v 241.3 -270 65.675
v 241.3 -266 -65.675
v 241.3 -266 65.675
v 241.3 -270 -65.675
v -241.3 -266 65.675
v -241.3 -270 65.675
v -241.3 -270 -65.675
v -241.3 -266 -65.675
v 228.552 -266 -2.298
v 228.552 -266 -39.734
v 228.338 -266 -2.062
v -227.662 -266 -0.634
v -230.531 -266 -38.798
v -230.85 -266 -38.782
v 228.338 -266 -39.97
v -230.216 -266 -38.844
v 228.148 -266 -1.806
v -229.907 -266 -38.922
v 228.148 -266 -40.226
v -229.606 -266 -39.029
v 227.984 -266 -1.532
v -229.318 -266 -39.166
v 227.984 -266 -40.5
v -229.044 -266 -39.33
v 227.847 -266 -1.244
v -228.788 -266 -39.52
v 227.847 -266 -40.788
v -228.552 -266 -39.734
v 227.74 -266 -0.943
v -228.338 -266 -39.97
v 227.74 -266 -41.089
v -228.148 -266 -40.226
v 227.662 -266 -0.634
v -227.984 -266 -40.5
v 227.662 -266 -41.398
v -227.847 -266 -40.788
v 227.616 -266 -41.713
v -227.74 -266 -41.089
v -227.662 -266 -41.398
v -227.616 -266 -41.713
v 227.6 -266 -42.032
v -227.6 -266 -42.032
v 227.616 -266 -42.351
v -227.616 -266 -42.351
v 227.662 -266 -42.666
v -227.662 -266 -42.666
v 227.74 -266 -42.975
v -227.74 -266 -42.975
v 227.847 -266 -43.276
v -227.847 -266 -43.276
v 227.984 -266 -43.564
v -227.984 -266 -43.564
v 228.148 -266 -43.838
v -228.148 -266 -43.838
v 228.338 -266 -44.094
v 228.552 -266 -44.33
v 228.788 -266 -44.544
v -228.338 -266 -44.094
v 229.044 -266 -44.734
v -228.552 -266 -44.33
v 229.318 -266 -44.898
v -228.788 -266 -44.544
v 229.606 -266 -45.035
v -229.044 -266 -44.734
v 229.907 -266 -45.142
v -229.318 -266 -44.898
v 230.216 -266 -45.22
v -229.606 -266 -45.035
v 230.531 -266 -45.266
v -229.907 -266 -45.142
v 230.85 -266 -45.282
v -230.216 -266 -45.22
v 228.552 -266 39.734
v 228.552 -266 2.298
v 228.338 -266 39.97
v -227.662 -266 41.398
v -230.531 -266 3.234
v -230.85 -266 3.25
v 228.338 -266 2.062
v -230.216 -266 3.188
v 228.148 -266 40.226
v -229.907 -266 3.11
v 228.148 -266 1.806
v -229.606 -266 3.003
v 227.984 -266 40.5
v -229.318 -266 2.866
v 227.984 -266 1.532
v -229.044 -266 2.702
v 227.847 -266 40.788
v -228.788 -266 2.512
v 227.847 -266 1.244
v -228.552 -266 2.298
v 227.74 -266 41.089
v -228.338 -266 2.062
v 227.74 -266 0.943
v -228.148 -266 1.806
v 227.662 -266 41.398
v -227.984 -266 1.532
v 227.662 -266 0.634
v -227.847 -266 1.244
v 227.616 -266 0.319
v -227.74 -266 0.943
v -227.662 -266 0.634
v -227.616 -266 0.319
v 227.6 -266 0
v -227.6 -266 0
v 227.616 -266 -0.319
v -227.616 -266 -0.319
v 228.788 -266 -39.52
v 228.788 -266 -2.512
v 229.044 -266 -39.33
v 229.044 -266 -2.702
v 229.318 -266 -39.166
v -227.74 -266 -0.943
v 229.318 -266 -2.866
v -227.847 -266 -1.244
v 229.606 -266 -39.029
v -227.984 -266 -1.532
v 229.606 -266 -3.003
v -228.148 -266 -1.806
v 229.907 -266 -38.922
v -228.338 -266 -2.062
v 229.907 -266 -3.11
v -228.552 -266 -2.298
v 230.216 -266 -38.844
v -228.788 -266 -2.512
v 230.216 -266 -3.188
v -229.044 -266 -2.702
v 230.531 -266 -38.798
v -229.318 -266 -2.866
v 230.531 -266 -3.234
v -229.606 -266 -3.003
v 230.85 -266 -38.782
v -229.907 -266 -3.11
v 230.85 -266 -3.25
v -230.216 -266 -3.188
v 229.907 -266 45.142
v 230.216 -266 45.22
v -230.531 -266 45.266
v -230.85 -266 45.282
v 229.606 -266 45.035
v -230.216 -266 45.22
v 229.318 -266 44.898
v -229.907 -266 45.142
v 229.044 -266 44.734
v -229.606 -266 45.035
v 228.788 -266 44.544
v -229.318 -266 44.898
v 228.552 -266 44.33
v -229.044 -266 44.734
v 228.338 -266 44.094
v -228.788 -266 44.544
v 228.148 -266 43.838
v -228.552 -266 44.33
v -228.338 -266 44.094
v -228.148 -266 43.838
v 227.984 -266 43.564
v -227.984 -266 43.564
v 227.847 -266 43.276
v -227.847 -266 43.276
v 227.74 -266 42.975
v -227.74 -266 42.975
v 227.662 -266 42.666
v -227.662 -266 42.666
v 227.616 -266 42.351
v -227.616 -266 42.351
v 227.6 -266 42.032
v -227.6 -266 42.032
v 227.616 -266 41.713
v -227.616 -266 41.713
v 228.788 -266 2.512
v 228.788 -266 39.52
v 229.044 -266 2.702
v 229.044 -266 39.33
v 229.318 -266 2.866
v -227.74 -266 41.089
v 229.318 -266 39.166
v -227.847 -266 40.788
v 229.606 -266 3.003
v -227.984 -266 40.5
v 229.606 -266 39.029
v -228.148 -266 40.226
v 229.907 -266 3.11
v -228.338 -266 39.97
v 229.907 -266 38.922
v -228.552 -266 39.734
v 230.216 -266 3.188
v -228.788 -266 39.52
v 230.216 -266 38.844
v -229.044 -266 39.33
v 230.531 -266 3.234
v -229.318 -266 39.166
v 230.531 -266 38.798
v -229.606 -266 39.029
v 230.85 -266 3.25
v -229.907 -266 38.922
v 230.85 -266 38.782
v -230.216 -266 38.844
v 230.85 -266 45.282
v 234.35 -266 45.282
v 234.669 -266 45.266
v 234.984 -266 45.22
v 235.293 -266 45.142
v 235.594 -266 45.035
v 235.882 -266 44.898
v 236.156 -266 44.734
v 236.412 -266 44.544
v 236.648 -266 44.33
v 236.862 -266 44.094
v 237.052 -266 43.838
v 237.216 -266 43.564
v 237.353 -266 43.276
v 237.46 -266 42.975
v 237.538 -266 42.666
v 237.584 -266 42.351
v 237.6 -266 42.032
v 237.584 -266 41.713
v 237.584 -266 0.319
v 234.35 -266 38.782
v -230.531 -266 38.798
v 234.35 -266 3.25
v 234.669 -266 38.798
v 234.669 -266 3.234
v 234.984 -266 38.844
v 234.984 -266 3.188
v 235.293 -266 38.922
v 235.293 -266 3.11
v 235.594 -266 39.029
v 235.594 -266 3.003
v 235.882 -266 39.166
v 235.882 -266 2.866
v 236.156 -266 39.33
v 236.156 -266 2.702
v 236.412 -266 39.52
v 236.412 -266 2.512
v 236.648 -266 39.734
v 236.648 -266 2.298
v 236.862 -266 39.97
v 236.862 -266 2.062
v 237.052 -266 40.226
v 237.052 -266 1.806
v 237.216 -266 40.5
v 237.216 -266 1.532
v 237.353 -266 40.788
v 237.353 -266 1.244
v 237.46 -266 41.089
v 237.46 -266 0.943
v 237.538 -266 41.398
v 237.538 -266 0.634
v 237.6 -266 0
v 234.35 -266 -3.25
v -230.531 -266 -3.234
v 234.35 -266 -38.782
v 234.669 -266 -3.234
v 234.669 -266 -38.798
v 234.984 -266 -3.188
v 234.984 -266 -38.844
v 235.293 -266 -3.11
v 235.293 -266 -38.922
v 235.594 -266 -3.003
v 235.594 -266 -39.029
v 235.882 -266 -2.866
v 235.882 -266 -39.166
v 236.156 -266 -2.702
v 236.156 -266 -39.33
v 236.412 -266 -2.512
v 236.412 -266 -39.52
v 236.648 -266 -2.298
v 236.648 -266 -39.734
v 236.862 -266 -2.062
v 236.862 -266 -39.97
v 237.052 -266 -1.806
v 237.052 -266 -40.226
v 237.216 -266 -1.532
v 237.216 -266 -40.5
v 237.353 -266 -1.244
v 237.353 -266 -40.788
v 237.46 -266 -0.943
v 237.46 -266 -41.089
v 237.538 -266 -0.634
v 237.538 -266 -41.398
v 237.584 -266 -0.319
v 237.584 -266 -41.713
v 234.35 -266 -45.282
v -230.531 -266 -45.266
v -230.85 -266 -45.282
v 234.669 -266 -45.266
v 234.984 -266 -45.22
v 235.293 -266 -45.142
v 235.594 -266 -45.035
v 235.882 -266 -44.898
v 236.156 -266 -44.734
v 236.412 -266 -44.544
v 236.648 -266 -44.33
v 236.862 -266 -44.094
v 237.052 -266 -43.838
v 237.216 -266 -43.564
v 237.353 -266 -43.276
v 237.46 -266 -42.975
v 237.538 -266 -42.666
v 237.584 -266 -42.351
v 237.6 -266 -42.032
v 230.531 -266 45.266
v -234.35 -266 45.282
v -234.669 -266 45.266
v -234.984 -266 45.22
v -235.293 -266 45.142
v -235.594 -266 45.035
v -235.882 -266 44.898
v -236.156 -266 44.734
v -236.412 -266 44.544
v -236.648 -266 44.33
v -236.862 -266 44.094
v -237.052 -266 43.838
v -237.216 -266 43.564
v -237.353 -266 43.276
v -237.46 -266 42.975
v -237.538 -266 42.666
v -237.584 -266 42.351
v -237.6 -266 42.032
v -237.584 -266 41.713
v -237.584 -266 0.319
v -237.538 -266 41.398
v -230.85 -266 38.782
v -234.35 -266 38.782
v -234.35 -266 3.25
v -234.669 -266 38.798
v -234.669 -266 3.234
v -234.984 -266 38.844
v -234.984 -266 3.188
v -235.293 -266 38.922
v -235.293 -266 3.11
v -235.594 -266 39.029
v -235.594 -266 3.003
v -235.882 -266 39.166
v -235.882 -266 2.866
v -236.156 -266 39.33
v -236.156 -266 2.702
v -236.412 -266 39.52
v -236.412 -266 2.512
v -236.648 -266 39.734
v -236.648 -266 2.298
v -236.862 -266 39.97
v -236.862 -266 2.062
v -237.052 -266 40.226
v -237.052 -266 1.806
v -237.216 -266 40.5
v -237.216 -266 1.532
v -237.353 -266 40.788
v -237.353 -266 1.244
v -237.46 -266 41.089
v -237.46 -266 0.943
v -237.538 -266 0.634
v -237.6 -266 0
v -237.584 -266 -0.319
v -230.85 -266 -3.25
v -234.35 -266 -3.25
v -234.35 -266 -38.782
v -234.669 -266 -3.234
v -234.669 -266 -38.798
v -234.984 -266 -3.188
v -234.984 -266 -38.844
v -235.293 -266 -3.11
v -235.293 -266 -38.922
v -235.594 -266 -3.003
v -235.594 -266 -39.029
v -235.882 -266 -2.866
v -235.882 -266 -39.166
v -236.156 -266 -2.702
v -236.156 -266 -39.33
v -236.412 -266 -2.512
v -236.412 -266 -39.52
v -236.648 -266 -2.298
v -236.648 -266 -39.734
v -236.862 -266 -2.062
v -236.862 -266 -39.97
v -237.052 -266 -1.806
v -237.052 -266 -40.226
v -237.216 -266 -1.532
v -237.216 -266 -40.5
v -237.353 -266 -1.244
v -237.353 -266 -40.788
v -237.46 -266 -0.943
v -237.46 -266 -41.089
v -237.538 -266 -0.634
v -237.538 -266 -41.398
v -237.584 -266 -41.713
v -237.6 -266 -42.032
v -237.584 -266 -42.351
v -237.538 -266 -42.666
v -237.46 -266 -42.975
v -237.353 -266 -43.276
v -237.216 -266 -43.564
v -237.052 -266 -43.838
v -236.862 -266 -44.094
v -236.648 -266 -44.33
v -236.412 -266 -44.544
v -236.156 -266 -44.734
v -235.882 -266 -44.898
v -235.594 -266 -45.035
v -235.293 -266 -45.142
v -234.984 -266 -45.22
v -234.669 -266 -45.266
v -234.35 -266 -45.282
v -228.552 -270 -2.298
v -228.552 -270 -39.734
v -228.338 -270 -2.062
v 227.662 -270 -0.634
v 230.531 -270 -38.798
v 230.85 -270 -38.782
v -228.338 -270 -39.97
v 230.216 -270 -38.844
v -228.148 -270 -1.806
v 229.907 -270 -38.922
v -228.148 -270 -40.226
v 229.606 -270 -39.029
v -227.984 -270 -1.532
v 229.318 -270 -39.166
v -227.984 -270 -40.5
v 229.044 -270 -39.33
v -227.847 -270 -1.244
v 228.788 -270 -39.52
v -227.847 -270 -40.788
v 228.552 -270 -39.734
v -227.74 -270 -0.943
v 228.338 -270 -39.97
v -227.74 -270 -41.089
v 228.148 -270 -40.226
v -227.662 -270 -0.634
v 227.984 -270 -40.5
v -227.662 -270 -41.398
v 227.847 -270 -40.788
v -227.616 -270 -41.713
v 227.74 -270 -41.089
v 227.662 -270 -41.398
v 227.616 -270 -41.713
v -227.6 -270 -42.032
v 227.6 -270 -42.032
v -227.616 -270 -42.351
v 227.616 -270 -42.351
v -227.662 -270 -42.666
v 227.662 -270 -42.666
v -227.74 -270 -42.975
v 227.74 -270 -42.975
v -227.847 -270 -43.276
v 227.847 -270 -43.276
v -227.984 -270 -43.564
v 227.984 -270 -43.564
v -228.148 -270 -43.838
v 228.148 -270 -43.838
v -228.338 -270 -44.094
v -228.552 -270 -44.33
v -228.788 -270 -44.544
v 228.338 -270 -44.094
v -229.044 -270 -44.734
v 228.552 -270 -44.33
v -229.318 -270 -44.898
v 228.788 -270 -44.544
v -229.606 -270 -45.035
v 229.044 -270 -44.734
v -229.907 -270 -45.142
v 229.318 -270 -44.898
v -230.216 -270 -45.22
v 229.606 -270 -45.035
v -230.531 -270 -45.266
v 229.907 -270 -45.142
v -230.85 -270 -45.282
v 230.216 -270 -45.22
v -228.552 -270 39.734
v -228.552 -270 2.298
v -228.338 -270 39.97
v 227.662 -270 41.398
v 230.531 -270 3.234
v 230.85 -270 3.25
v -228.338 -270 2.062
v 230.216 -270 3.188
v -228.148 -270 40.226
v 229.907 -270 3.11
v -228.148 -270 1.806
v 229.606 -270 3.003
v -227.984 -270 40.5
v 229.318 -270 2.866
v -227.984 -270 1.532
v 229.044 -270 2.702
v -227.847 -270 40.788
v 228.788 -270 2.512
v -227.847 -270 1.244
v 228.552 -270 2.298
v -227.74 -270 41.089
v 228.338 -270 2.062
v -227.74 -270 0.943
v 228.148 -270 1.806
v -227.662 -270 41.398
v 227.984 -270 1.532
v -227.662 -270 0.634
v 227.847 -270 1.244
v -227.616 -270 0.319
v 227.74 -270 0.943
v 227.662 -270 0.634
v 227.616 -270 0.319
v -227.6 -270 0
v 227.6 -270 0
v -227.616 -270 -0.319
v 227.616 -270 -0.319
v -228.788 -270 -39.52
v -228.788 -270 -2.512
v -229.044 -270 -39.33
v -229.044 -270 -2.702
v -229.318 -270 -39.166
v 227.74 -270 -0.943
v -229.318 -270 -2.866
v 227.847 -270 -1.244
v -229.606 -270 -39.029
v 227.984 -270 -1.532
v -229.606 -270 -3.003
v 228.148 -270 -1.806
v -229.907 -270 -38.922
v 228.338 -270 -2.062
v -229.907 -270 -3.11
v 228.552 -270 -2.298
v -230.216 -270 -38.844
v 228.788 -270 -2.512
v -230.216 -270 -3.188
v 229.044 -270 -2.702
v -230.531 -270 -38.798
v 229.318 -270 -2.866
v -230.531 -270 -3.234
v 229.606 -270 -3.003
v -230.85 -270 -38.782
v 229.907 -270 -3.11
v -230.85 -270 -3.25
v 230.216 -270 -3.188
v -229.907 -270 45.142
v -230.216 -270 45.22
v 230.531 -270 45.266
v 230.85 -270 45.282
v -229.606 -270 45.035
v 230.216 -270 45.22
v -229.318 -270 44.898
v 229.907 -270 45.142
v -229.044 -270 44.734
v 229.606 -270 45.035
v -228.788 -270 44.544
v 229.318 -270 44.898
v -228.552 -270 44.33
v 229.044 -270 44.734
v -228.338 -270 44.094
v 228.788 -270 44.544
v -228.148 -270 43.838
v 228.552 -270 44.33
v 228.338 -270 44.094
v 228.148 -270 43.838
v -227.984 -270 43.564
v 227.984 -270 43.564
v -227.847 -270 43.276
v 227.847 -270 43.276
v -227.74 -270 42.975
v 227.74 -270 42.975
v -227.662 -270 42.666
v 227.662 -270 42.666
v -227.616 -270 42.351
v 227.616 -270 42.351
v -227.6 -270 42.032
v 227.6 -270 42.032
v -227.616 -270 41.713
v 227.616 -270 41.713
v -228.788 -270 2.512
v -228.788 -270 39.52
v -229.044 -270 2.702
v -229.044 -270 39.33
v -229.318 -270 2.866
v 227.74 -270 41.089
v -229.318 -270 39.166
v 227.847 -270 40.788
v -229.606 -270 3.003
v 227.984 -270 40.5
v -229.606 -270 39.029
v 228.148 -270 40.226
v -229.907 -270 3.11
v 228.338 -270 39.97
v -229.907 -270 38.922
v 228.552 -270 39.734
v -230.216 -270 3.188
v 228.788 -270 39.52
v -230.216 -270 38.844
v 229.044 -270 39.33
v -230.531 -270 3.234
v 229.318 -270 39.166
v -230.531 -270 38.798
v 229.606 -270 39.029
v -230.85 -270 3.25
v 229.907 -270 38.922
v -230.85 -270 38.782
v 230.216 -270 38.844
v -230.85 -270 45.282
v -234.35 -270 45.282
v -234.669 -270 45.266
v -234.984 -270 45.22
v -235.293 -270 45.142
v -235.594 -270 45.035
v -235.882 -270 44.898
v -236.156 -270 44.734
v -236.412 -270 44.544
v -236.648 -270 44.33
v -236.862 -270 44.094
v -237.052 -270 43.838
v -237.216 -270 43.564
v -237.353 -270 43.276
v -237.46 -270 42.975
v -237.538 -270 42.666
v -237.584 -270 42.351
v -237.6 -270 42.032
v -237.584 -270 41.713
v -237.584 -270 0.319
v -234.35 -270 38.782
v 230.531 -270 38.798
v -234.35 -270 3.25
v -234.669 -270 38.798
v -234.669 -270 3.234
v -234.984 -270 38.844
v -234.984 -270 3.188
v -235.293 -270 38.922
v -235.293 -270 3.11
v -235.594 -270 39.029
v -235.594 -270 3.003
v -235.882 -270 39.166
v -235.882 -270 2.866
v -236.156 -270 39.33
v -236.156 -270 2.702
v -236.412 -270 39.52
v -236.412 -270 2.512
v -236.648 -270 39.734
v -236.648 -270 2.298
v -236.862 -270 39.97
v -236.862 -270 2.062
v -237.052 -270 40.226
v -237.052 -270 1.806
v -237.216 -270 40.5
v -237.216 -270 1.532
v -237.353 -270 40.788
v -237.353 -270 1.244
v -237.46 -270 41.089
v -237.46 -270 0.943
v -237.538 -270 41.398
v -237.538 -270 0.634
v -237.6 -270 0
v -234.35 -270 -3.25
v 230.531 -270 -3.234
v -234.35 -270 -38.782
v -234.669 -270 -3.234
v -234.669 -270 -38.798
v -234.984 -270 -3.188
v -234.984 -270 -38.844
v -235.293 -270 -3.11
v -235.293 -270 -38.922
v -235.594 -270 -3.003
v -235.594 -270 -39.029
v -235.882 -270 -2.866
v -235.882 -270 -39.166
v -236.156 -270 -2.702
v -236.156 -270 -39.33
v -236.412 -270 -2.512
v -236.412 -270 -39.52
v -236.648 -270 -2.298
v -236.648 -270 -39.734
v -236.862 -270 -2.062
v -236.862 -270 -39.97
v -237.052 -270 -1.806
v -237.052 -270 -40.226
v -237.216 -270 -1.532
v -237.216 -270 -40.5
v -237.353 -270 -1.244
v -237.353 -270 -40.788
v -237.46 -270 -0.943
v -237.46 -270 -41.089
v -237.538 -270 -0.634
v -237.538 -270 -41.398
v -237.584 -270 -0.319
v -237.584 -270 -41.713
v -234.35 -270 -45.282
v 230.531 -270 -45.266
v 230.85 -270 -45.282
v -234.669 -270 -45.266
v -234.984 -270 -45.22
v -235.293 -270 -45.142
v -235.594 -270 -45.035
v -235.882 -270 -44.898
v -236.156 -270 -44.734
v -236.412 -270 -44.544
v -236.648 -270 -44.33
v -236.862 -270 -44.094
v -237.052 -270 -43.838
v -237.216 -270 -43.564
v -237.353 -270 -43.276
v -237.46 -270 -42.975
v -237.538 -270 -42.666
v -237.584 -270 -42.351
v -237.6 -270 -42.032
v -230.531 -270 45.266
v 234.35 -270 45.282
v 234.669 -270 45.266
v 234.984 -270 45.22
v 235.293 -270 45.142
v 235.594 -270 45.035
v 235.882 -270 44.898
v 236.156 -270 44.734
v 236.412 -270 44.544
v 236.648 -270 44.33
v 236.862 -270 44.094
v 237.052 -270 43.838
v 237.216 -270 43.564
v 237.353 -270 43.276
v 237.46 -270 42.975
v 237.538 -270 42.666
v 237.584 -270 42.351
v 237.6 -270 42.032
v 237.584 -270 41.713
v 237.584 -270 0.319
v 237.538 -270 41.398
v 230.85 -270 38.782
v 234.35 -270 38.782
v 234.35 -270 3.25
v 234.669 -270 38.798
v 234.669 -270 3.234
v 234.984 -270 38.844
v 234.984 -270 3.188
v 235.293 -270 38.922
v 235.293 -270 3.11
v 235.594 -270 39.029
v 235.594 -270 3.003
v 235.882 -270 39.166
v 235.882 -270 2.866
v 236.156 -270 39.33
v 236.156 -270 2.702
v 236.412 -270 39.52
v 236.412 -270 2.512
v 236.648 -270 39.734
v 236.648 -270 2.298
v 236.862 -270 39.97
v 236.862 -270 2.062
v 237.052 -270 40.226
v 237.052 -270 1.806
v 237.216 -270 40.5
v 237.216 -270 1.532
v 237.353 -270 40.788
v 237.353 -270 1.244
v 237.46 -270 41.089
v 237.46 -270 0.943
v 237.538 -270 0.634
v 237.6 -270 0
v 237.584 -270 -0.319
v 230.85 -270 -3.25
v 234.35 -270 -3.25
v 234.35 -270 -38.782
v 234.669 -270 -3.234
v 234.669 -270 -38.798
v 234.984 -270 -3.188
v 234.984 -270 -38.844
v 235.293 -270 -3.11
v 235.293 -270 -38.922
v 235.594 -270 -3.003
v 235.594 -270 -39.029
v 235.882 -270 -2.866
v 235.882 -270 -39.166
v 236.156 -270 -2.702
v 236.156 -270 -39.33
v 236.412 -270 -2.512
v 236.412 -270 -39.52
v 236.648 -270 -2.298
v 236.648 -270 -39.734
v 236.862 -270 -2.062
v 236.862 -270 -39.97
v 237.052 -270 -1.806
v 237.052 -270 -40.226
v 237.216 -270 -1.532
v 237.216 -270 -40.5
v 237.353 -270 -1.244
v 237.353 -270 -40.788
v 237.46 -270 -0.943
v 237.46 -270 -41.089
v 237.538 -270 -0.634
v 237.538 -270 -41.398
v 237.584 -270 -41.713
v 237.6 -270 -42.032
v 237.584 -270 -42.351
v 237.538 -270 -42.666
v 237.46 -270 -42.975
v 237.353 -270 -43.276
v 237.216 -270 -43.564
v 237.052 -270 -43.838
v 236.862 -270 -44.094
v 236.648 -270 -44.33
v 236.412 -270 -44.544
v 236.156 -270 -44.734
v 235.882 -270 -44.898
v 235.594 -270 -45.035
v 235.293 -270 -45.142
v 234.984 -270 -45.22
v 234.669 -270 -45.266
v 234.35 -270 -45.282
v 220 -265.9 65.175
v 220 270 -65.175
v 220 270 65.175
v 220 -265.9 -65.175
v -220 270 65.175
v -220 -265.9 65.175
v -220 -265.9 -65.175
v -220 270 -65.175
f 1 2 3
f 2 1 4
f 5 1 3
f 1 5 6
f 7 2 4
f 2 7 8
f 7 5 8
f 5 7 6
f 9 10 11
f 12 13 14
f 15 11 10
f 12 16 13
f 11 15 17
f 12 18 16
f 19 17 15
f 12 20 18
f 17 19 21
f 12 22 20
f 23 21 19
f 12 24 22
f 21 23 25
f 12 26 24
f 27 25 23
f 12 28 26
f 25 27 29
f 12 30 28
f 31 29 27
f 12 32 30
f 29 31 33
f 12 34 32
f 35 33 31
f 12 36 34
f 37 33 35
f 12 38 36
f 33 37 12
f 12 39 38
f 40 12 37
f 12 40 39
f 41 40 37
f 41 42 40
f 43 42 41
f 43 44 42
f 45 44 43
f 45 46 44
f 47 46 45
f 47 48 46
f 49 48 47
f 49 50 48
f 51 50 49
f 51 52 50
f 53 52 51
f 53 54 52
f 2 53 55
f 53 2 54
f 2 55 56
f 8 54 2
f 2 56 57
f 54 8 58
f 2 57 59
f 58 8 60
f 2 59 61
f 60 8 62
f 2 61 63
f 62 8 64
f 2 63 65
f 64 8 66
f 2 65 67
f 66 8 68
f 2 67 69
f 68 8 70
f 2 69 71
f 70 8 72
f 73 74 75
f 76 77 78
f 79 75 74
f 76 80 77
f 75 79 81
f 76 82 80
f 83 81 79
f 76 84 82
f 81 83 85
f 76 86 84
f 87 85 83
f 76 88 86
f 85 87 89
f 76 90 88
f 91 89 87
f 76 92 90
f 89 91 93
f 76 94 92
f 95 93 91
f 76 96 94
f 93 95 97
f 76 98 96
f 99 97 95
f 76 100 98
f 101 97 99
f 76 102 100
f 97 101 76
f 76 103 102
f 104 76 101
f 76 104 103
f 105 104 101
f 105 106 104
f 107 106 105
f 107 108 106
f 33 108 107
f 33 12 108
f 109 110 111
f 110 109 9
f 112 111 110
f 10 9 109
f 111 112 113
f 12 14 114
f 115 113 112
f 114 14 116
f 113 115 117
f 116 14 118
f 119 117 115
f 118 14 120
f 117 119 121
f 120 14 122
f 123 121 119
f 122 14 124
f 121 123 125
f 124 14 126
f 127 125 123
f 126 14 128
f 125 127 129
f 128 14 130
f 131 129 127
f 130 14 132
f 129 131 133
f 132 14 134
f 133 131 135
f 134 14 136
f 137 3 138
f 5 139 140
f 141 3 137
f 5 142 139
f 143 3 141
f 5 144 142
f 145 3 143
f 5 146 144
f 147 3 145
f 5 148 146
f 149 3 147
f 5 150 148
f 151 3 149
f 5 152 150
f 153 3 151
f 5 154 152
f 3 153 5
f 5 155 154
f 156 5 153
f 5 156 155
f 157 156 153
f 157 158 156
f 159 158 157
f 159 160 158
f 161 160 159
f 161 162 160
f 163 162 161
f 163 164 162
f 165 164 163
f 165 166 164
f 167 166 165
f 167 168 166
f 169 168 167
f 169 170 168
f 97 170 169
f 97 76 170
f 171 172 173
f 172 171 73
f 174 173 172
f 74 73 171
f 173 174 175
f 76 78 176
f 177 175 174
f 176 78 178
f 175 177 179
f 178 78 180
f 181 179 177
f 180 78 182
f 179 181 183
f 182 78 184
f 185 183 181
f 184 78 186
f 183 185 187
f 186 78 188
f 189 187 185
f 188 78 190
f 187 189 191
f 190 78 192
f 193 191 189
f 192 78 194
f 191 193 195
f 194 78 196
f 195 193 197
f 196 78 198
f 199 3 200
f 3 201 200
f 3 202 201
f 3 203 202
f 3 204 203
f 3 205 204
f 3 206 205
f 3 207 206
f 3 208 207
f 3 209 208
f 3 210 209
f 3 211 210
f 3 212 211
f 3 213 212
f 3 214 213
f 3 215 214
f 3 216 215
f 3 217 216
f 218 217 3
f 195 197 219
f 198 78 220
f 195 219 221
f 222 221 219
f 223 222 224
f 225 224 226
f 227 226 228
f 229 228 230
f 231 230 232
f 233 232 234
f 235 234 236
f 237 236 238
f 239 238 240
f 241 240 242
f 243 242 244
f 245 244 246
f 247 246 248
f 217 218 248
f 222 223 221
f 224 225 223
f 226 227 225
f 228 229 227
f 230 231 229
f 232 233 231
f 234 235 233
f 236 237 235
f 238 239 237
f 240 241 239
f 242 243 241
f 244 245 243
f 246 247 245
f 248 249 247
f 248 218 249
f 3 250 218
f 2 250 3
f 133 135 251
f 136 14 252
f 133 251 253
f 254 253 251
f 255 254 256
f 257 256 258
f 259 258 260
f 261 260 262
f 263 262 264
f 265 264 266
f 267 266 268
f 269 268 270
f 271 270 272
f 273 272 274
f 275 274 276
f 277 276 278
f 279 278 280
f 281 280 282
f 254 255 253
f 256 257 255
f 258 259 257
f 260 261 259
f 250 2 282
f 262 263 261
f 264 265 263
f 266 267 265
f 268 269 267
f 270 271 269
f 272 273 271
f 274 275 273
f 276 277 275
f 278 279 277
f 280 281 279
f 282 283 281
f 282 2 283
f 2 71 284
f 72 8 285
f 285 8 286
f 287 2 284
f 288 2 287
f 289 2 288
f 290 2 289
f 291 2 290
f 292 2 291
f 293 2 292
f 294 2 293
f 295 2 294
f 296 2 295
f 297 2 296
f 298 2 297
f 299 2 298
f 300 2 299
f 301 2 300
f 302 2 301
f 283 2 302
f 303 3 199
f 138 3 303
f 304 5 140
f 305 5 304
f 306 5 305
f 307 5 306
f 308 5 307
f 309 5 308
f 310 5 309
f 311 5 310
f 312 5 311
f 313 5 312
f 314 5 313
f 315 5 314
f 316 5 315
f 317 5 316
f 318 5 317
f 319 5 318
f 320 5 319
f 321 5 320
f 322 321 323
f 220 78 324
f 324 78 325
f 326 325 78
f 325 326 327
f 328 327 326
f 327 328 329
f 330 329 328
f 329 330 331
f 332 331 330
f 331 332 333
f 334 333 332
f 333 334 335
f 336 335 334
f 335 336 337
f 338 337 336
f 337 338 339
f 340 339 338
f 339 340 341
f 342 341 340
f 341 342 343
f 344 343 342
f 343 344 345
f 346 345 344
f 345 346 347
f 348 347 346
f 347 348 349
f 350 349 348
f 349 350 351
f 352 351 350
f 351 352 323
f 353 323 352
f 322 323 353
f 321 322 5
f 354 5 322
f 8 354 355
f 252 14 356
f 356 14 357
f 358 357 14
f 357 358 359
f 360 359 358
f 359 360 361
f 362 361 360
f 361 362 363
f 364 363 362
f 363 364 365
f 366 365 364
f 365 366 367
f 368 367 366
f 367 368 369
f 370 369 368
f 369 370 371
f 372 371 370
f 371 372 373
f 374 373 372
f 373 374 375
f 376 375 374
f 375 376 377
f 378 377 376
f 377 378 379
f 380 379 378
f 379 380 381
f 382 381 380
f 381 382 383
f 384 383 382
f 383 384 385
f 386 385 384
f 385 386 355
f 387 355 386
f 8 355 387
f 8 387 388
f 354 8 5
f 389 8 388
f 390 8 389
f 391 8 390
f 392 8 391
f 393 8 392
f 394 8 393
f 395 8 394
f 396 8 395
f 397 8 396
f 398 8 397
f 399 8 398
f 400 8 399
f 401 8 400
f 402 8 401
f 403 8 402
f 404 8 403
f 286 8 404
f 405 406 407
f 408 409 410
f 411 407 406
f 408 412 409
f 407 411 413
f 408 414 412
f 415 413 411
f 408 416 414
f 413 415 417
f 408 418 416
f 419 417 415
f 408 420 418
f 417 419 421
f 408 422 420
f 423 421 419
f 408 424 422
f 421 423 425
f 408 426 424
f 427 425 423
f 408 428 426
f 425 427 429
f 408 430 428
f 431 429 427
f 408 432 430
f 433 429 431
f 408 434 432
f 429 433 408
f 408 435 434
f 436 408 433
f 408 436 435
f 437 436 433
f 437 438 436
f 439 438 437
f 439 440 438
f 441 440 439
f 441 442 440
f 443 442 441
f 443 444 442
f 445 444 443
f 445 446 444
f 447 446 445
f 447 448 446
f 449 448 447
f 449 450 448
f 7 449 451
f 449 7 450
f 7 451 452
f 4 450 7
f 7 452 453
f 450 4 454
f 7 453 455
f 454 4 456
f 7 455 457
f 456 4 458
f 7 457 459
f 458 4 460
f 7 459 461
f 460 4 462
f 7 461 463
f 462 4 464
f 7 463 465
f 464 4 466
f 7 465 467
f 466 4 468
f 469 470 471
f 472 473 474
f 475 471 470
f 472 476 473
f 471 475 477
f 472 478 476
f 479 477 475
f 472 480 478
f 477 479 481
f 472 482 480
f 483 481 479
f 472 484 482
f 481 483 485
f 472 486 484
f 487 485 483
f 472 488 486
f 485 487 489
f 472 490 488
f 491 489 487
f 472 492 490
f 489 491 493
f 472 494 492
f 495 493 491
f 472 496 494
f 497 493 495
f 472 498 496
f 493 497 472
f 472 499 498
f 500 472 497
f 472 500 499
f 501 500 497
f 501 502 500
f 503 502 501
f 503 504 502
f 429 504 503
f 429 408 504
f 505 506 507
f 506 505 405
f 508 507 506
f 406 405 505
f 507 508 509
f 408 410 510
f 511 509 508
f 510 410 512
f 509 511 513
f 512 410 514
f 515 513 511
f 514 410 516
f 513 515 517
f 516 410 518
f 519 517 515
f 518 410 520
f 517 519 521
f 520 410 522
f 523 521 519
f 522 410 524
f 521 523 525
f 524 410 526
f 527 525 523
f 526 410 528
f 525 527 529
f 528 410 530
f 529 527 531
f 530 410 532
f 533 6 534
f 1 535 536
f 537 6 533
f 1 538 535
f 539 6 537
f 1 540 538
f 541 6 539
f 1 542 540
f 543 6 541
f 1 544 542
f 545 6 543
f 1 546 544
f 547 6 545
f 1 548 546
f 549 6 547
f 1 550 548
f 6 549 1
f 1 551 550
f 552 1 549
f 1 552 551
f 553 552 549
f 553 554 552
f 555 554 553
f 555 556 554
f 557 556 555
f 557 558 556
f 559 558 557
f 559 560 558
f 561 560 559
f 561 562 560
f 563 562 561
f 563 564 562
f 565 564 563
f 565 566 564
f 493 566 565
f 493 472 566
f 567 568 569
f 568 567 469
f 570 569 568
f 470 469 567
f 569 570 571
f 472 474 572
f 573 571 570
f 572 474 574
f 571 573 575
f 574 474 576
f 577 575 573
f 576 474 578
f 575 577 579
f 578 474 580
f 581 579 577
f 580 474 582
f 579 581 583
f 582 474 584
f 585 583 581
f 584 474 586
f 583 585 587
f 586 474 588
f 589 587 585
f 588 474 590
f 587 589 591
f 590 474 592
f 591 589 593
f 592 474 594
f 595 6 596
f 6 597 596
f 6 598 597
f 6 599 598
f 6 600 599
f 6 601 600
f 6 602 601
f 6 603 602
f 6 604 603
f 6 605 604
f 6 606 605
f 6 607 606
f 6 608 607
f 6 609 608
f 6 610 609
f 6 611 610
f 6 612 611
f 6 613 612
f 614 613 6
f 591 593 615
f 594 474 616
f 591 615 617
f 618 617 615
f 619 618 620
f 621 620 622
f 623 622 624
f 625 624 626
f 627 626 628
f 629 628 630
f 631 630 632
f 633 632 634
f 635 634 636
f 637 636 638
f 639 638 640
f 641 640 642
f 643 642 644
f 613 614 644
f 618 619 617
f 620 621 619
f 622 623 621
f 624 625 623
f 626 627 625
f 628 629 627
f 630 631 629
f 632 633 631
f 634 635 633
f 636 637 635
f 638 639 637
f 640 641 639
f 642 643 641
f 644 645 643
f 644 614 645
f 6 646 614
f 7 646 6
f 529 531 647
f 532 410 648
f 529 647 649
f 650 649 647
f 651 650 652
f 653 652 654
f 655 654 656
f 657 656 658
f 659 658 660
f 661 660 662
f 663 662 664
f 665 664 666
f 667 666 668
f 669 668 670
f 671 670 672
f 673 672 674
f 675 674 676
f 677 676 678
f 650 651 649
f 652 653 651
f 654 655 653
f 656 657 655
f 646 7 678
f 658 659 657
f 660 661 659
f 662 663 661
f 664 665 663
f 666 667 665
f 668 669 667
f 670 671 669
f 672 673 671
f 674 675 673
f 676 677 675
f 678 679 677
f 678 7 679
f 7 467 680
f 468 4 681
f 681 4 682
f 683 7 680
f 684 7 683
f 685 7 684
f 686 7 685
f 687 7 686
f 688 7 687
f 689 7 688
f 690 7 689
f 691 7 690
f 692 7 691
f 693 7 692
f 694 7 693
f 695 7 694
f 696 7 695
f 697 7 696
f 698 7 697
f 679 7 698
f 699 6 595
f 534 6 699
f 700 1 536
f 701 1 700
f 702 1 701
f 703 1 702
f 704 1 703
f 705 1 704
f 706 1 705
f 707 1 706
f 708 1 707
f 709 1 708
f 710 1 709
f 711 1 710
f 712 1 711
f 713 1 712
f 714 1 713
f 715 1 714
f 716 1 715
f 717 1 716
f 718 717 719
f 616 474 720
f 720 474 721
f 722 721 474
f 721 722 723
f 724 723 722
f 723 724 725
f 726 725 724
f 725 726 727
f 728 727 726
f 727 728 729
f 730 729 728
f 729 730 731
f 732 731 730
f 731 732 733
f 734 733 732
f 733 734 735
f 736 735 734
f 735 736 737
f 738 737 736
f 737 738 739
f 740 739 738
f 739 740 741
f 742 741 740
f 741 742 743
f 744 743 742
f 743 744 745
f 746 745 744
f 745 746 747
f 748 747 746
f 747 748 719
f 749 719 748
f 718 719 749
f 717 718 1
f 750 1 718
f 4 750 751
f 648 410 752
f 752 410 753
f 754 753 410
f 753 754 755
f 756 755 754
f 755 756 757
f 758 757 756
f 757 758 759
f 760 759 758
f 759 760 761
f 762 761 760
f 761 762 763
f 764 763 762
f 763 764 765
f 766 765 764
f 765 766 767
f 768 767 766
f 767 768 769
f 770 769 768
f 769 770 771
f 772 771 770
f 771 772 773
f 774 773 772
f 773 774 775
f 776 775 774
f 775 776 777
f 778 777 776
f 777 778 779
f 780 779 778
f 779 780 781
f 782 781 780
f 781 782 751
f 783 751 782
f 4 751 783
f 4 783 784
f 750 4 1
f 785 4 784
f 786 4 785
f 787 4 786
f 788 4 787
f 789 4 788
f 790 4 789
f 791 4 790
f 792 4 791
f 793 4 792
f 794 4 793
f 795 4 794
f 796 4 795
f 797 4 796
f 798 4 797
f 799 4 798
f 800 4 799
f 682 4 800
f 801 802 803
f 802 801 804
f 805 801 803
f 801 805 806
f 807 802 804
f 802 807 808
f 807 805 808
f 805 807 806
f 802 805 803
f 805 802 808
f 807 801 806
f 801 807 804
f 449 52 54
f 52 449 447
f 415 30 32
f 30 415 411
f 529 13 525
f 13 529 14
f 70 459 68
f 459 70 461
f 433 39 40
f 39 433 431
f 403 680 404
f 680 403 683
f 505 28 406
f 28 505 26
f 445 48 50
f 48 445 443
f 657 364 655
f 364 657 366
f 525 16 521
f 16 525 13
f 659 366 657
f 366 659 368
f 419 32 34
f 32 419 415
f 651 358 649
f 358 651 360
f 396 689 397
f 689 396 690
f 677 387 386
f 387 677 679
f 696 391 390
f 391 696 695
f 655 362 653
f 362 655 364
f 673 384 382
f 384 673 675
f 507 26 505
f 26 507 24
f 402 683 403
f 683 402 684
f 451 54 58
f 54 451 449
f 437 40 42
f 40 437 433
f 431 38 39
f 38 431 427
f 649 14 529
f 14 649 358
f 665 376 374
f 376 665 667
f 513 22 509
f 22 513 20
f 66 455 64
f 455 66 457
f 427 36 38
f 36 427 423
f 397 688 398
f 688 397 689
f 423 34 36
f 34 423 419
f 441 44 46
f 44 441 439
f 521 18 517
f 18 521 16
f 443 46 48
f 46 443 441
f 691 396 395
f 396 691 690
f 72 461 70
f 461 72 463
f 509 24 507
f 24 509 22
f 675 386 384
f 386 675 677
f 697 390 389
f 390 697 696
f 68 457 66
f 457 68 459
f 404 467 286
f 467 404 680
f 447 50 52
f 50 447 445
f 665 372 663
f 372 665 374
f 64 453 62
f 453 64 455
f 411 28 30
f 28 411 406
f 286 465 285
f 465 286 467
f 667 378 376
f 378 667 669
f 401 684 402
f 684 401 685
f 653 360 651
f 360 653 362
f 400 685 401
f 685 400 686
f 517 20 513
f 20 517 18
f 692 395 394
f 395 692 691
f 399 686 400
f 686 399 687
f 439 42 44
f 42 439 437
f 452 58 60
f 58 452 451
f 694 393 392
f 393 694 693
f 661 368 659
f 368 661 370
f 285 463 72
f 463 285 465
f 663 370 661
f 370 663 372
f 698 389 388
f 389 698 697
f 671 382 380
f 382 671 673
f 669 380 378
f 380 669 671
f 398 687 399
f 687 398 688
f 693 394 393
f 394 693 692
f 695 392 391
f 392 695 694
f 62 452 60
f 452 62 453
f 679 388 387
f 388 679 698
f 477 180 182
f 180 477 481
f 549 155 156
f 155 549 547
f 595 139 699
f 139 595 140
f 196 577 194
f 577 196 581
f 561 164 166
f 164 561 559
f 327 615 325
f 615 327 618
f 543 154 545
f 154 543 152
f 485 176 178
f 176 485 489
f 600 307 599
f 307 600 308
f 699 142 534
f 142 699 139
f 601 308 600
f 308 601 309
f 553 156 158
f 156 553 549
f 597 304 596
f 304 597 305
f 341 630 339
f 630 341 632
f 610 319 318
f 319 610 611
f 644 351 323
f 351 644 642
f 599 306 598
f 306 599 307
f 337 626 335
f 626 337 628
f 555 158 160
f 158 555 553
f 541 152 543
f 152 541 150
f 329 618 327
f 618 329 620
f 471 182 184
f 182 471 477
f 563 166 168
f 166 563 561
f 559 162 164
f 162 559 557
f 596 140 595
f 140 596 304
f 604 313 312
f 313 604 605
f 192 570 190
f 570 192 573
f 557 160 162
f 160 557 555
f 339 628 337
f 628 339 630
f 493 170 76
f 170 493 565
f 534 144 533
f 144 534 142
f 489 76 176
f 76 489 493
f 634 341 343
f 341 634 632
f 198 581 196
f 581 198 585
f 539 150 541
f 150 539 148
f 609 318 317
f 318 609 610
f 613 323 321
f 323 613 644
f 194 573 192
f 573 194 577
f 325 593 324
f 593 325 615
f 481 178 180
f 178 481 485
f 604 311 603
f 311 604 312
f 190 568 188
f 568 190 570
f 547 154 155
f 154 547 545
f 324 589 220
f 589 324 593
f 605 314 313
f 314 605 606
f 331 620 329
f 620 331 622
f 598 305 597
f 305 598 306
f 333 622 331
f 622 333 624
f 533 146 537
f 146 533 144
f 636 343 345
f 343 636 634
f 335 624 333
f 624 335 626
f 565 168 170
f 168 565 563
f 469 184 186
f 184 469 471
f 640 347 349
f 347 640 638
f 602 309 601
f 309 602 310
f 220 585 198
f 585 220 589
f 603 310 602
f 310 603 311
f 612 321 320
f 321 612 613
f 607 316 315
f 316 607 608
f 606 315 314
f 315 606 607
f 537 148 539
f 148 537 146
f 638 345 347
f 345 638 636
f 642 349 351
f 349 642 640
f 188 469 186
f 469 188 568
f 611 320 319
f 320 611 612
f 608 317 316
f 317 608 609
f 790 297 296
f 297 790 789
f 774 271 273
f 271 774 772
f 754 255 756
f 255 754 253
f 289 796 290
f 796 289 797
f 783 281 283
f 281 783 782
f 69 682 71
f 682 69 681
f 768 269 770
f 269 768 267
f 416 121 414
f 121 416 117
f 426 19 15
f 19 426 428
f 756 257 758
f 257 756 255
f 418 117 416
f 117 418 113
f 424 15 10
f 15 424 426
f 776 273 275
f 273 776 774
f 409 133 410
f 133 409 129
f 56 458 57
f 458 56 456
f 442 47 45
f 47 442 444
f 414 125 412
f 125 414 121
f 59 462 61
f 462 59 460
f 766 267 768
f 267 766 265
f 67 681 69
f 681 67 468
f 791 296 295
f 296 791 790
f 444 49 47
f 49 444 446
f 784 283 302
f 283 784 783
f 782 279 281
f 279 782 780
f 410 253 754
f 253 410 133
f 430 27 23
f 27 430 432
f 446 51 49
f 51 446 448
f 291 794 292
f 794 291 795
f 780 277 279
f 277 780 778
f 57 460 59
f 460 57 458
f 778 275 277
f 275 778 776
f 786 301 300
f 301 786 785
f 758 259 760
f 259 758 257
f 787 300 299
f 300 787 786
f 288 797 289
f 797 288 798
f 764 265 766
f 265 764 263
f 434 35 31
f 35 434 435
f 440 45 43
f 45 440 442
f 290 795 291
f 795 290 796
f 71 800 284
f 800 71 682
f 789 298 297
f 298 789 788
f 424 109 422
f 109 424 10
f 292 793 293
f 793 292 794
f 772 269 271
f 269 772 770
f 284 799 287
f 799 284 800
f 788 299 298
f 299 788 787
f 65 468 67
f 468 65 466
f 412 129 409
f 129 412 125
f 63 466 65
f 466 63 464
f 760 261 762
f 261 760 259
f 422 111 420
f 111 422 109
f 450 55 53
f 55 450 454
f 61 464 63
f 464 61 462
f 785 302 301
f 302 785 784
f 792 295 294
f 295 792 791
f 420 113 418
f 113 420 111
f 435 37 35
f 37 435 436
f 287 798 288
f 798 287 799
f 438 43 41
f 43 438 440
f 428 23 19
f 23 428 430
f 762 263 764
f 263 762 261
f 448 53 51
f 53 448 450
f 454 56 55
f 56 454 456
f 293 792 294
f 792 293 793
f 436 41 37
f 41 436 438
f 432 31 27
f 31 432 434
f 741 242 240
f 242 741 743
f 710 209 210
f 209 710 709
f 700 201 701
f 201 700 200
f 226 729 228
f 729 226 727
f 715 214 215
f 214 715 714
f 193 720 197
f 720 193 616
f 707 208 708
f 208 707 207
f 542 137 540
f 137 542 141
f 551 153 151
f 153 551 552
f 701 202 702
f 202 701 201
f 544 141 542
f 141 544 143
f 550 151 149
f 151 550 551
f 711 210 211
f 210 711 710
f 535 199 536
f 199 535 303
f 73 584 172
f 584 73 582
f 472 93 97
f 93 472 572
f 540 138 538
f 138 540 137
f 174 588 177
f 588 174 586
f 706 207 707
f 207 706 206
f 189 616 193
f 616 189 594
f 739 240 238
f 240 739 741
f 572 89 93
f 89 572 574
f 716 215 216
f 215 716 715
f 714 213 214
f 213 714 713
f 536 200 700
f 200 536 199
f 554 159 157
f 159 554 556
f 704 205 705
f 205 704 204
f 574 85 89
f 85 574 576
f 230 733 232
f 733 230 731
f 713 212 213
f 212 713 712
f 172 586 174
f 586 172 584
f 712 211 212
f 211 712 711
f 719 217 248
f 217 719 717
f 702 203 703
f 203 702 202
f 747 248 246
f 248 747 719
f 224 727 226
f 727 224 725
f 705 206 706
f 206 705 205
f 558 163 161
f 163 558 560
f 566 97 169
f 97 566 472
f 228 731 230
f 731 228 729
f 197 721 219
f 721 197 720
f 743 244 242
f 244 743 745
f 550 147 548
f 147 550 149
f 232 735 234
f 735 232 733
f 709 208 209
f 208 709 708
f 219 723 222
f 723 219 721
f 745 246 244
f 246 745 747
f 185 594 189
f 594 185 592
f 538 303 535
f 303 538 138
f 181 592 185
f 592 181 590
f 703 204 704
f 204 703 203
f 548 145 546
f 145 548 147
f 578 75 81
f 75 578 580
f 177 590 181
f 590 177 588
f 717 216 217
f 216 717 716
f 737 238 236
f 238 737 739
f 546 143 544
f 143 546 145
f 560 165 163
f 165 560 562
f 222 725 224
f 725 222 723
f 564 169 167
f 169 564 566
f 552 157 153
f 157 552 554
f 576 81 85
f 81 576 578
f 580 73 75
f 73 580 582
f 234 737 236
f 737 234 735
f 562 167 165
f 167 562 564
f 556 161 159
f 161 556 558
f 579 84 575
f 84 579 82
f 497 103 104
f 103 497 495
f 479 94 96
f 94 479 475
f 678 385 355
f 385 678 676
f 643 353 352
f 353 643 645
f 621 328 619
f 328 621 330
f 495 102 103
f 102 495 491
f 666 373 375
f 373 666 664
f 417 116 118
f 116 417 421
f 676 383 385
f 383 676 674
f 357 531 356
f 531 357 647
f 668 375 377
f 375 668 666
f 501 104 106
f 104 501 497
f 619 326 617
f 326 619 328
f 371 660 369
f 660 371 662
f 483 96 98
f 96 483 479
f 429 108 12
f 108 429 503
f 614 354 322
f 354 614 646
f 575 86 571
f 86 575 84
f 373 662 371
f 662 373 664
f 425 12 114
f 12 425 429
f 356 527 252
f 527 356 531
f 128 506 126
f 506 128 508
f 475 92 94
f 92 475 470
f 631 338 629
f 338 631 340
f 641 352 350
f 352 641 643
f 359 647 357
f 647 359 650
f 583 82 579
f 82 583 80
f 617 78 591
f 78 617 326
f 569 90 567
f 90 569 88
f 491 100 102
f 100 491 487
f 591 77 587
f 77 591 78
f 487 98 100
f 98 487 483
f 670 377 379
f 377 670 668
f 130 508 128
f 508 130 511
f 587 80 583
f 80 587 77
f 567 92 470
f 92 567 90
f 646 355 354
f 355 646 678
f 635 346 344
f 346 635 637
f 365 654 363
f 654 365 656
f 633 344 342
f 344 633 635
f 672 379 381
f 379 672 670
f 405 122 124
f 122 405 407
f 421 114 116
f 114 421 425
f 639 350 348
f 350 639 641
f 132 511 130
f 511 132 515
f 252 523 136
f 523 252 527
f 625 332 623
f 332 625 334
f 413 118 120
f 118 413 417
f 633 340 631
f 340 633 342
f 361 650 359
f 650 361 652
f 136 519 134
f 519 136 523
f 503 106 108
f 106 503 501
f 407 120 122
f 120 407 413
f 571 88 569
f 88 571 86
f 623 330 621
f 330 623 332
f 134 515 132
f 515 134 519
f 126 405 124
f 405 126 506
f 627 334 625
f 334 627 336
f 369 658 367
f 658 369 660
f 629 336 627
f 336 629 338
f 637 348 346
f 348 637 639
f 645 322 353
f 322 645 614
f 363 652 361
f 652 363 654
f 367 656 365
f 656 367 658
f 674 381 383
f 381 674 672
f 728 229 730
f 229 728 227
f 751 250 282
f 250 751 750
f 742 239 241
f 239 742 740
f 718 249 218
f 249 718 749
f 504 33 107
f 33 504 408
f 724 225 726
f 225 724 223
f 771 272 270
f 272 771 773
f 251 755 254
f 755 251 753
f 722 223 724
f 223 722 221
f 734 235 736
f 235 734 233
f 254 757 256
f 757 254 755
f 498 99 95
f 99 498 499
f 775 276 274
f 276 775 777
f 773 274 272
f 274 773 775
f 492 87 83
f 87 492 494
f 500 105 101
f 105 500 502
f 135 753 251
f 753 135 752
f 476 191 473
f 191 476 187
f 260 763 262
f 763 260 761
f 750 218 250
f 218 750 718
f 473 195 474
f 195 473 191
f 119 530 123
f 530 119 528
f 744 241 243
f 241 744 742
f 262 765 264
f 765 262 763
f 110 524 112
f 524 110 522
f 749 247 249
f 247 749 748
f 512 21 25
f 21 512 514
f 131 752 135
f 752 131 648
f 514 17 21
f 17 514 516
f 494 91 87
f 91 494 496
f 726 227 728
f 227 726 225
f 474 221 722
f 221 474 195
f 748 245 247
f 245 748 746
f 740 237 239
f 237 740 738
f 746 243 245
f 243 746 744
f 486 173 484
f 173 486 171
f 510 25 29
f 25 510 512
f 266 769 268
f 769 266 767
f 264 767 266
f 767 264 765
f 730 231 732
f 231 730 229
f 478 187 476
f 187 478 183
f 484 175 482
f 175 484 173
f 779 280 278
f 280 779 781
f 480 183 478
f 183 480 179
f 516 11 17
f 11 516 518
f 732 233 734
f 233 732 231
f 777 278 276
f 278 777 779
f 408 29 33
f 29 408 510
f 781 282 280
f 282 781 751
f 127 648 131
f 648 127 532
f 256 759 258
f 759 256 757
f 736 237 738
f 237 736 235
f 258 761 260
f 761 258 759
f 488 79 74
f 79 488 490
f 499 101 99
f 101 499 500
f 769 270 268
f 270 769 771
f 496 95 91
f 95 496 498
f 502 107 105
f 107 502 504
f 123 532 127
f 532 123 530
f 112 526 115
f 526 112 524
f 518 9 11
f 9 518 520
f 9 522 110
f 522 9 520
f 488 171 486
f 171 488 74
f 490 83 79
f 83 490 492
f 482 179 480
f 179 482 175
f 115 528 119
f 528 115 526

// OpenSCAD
// ============================================================================
// Atom Lithography Machine — Parametric OpenSCAD Module (S6.3-05)
// ============================================================================
// part_id           : S6.3-05
// parent_bom_id     : S6.3
// subsystem         : S6
// part_name         : Cift-kutuplu superiletken miknatis guc kaynagi (±100 A) ve HTS akim uclari
// material          : Steel
// temp_stage        : 300 K -> 4 K
// vacuum_grade      : Atmosfer/Kriyo
// tolerance         : ±10 ppm
// computed_mass_kg  : 22.22199
// envelope_mm       : 482.600 x 574.550 x 131.350
// design_maturity   : M0_M1_DETAILED_CAD_DESIGN_ONLY
// no_lab_measurement: true
// iec61508_certified: false
// semi_s2_certified : false
// Units: millimeters (mm)
// ============================================================================

$fn = 64;

// Nominal bounding envelope parameters (mm)
bbox_x = 482.6000;
bbox_y = 574.5500;
bbox_z = 131.3500;

// Part-specific parametric dimensions
rack_u = 3;
bay = 2;
u_start = 1;
i_max_a = 100.0;

// Interface / port parameters (mm)

module part_S6_3_05() {
  difference() {
    union() {
      // 19" EIA-310 front bezel panel
      translate([0.000, -268.000, 0.000]) cube([482.600, 4.000, 131.350], center=true);
      // Hollow EMI shielded chassis body
      translate([0.000, 2.050, 0.000]) cube([440.000, 535.900, 130.350], center=true);
    }
    // EIA-310 rack ear slot
    translate([-232.600, -268.000, -42.032]) rotate([90.000, 0.000, 0.000]) {
      hull() {
        translate([-1.750, 0, 0]) cylinder(d=6.500, h=6.000, center=true);
        translate([1.750, 0, 0]) cylinder(d=6.500, h=6.000, center=true);
      }
    }
    // EIA-310 rack ear slot
    translate([-232.600, -268.000, 42.032]) rotate([90.000, 0.000, 0.000]) {
      hull() {
        translate([-1.750, 0, 0]) cylinder(d=6.500, h=6.000, center=true);
        translate([1.750, 0, 0]) cylinder(d=6.500, h=6.000, center=true);
      }
    }
    // EIA-310 rack ear slot
    translate([232.600, -268.000, -42.032]) rotate([90.000, 0.000, 0.000]) {
      hull() {
        translate([-1.750, 0, 0]) cylinder(d=6.500, h=6.000, center=true);
        translate([1.750, 0, 0]) cylinder(d=6.500, h=6.000, center=true);
      }
    }
    // EIA-310 rack ear slot
    translate([232.600, -268.000, 42.032]) rotate([90.000, 0.000, 0.000]) {
      hull() {
        translate([-1.750, 0, 0]) cylinder(d=6.500, h=6.000, center=true);
        translate([1.750, 0, 0]) cylinder(d=6.500, h=6.000, center=true);
      }
    }
    // EIA-310 rack ear slot
    translate([-232.600, -268.000, 0.000]) rotate([90.000, 0.000, 0.000]) {
      hull() {
        translate([-1.750, 0, 0]) cylinder(d=6.500, h=6.000, center=true);
        translate([1.750, 0, 0]) cylinder(d=6.500, h=6.000, center=true);
      }
    }
    // EIA-310 rack ear slot
    translate([232.600, -268.000, 0.000]) rotate([90.000, 0.000, 0.000]) {
      hull() {
        translate([-1.750, 0, 0]) cylinder(d=6.500, h=6.000, center=true);
        translate([1.750, 0, 0]) cylinder(d=6.500, h=6.000, center=true);
      }
    }
  }
}

// World assembly mounting transform (global machine frame, mm / deg):
// translate([2100.000, 0.000, 156.675]) rotate([0.000, 0.000, 0.000]) part_S6_3_05();

part_S6_3_05();
